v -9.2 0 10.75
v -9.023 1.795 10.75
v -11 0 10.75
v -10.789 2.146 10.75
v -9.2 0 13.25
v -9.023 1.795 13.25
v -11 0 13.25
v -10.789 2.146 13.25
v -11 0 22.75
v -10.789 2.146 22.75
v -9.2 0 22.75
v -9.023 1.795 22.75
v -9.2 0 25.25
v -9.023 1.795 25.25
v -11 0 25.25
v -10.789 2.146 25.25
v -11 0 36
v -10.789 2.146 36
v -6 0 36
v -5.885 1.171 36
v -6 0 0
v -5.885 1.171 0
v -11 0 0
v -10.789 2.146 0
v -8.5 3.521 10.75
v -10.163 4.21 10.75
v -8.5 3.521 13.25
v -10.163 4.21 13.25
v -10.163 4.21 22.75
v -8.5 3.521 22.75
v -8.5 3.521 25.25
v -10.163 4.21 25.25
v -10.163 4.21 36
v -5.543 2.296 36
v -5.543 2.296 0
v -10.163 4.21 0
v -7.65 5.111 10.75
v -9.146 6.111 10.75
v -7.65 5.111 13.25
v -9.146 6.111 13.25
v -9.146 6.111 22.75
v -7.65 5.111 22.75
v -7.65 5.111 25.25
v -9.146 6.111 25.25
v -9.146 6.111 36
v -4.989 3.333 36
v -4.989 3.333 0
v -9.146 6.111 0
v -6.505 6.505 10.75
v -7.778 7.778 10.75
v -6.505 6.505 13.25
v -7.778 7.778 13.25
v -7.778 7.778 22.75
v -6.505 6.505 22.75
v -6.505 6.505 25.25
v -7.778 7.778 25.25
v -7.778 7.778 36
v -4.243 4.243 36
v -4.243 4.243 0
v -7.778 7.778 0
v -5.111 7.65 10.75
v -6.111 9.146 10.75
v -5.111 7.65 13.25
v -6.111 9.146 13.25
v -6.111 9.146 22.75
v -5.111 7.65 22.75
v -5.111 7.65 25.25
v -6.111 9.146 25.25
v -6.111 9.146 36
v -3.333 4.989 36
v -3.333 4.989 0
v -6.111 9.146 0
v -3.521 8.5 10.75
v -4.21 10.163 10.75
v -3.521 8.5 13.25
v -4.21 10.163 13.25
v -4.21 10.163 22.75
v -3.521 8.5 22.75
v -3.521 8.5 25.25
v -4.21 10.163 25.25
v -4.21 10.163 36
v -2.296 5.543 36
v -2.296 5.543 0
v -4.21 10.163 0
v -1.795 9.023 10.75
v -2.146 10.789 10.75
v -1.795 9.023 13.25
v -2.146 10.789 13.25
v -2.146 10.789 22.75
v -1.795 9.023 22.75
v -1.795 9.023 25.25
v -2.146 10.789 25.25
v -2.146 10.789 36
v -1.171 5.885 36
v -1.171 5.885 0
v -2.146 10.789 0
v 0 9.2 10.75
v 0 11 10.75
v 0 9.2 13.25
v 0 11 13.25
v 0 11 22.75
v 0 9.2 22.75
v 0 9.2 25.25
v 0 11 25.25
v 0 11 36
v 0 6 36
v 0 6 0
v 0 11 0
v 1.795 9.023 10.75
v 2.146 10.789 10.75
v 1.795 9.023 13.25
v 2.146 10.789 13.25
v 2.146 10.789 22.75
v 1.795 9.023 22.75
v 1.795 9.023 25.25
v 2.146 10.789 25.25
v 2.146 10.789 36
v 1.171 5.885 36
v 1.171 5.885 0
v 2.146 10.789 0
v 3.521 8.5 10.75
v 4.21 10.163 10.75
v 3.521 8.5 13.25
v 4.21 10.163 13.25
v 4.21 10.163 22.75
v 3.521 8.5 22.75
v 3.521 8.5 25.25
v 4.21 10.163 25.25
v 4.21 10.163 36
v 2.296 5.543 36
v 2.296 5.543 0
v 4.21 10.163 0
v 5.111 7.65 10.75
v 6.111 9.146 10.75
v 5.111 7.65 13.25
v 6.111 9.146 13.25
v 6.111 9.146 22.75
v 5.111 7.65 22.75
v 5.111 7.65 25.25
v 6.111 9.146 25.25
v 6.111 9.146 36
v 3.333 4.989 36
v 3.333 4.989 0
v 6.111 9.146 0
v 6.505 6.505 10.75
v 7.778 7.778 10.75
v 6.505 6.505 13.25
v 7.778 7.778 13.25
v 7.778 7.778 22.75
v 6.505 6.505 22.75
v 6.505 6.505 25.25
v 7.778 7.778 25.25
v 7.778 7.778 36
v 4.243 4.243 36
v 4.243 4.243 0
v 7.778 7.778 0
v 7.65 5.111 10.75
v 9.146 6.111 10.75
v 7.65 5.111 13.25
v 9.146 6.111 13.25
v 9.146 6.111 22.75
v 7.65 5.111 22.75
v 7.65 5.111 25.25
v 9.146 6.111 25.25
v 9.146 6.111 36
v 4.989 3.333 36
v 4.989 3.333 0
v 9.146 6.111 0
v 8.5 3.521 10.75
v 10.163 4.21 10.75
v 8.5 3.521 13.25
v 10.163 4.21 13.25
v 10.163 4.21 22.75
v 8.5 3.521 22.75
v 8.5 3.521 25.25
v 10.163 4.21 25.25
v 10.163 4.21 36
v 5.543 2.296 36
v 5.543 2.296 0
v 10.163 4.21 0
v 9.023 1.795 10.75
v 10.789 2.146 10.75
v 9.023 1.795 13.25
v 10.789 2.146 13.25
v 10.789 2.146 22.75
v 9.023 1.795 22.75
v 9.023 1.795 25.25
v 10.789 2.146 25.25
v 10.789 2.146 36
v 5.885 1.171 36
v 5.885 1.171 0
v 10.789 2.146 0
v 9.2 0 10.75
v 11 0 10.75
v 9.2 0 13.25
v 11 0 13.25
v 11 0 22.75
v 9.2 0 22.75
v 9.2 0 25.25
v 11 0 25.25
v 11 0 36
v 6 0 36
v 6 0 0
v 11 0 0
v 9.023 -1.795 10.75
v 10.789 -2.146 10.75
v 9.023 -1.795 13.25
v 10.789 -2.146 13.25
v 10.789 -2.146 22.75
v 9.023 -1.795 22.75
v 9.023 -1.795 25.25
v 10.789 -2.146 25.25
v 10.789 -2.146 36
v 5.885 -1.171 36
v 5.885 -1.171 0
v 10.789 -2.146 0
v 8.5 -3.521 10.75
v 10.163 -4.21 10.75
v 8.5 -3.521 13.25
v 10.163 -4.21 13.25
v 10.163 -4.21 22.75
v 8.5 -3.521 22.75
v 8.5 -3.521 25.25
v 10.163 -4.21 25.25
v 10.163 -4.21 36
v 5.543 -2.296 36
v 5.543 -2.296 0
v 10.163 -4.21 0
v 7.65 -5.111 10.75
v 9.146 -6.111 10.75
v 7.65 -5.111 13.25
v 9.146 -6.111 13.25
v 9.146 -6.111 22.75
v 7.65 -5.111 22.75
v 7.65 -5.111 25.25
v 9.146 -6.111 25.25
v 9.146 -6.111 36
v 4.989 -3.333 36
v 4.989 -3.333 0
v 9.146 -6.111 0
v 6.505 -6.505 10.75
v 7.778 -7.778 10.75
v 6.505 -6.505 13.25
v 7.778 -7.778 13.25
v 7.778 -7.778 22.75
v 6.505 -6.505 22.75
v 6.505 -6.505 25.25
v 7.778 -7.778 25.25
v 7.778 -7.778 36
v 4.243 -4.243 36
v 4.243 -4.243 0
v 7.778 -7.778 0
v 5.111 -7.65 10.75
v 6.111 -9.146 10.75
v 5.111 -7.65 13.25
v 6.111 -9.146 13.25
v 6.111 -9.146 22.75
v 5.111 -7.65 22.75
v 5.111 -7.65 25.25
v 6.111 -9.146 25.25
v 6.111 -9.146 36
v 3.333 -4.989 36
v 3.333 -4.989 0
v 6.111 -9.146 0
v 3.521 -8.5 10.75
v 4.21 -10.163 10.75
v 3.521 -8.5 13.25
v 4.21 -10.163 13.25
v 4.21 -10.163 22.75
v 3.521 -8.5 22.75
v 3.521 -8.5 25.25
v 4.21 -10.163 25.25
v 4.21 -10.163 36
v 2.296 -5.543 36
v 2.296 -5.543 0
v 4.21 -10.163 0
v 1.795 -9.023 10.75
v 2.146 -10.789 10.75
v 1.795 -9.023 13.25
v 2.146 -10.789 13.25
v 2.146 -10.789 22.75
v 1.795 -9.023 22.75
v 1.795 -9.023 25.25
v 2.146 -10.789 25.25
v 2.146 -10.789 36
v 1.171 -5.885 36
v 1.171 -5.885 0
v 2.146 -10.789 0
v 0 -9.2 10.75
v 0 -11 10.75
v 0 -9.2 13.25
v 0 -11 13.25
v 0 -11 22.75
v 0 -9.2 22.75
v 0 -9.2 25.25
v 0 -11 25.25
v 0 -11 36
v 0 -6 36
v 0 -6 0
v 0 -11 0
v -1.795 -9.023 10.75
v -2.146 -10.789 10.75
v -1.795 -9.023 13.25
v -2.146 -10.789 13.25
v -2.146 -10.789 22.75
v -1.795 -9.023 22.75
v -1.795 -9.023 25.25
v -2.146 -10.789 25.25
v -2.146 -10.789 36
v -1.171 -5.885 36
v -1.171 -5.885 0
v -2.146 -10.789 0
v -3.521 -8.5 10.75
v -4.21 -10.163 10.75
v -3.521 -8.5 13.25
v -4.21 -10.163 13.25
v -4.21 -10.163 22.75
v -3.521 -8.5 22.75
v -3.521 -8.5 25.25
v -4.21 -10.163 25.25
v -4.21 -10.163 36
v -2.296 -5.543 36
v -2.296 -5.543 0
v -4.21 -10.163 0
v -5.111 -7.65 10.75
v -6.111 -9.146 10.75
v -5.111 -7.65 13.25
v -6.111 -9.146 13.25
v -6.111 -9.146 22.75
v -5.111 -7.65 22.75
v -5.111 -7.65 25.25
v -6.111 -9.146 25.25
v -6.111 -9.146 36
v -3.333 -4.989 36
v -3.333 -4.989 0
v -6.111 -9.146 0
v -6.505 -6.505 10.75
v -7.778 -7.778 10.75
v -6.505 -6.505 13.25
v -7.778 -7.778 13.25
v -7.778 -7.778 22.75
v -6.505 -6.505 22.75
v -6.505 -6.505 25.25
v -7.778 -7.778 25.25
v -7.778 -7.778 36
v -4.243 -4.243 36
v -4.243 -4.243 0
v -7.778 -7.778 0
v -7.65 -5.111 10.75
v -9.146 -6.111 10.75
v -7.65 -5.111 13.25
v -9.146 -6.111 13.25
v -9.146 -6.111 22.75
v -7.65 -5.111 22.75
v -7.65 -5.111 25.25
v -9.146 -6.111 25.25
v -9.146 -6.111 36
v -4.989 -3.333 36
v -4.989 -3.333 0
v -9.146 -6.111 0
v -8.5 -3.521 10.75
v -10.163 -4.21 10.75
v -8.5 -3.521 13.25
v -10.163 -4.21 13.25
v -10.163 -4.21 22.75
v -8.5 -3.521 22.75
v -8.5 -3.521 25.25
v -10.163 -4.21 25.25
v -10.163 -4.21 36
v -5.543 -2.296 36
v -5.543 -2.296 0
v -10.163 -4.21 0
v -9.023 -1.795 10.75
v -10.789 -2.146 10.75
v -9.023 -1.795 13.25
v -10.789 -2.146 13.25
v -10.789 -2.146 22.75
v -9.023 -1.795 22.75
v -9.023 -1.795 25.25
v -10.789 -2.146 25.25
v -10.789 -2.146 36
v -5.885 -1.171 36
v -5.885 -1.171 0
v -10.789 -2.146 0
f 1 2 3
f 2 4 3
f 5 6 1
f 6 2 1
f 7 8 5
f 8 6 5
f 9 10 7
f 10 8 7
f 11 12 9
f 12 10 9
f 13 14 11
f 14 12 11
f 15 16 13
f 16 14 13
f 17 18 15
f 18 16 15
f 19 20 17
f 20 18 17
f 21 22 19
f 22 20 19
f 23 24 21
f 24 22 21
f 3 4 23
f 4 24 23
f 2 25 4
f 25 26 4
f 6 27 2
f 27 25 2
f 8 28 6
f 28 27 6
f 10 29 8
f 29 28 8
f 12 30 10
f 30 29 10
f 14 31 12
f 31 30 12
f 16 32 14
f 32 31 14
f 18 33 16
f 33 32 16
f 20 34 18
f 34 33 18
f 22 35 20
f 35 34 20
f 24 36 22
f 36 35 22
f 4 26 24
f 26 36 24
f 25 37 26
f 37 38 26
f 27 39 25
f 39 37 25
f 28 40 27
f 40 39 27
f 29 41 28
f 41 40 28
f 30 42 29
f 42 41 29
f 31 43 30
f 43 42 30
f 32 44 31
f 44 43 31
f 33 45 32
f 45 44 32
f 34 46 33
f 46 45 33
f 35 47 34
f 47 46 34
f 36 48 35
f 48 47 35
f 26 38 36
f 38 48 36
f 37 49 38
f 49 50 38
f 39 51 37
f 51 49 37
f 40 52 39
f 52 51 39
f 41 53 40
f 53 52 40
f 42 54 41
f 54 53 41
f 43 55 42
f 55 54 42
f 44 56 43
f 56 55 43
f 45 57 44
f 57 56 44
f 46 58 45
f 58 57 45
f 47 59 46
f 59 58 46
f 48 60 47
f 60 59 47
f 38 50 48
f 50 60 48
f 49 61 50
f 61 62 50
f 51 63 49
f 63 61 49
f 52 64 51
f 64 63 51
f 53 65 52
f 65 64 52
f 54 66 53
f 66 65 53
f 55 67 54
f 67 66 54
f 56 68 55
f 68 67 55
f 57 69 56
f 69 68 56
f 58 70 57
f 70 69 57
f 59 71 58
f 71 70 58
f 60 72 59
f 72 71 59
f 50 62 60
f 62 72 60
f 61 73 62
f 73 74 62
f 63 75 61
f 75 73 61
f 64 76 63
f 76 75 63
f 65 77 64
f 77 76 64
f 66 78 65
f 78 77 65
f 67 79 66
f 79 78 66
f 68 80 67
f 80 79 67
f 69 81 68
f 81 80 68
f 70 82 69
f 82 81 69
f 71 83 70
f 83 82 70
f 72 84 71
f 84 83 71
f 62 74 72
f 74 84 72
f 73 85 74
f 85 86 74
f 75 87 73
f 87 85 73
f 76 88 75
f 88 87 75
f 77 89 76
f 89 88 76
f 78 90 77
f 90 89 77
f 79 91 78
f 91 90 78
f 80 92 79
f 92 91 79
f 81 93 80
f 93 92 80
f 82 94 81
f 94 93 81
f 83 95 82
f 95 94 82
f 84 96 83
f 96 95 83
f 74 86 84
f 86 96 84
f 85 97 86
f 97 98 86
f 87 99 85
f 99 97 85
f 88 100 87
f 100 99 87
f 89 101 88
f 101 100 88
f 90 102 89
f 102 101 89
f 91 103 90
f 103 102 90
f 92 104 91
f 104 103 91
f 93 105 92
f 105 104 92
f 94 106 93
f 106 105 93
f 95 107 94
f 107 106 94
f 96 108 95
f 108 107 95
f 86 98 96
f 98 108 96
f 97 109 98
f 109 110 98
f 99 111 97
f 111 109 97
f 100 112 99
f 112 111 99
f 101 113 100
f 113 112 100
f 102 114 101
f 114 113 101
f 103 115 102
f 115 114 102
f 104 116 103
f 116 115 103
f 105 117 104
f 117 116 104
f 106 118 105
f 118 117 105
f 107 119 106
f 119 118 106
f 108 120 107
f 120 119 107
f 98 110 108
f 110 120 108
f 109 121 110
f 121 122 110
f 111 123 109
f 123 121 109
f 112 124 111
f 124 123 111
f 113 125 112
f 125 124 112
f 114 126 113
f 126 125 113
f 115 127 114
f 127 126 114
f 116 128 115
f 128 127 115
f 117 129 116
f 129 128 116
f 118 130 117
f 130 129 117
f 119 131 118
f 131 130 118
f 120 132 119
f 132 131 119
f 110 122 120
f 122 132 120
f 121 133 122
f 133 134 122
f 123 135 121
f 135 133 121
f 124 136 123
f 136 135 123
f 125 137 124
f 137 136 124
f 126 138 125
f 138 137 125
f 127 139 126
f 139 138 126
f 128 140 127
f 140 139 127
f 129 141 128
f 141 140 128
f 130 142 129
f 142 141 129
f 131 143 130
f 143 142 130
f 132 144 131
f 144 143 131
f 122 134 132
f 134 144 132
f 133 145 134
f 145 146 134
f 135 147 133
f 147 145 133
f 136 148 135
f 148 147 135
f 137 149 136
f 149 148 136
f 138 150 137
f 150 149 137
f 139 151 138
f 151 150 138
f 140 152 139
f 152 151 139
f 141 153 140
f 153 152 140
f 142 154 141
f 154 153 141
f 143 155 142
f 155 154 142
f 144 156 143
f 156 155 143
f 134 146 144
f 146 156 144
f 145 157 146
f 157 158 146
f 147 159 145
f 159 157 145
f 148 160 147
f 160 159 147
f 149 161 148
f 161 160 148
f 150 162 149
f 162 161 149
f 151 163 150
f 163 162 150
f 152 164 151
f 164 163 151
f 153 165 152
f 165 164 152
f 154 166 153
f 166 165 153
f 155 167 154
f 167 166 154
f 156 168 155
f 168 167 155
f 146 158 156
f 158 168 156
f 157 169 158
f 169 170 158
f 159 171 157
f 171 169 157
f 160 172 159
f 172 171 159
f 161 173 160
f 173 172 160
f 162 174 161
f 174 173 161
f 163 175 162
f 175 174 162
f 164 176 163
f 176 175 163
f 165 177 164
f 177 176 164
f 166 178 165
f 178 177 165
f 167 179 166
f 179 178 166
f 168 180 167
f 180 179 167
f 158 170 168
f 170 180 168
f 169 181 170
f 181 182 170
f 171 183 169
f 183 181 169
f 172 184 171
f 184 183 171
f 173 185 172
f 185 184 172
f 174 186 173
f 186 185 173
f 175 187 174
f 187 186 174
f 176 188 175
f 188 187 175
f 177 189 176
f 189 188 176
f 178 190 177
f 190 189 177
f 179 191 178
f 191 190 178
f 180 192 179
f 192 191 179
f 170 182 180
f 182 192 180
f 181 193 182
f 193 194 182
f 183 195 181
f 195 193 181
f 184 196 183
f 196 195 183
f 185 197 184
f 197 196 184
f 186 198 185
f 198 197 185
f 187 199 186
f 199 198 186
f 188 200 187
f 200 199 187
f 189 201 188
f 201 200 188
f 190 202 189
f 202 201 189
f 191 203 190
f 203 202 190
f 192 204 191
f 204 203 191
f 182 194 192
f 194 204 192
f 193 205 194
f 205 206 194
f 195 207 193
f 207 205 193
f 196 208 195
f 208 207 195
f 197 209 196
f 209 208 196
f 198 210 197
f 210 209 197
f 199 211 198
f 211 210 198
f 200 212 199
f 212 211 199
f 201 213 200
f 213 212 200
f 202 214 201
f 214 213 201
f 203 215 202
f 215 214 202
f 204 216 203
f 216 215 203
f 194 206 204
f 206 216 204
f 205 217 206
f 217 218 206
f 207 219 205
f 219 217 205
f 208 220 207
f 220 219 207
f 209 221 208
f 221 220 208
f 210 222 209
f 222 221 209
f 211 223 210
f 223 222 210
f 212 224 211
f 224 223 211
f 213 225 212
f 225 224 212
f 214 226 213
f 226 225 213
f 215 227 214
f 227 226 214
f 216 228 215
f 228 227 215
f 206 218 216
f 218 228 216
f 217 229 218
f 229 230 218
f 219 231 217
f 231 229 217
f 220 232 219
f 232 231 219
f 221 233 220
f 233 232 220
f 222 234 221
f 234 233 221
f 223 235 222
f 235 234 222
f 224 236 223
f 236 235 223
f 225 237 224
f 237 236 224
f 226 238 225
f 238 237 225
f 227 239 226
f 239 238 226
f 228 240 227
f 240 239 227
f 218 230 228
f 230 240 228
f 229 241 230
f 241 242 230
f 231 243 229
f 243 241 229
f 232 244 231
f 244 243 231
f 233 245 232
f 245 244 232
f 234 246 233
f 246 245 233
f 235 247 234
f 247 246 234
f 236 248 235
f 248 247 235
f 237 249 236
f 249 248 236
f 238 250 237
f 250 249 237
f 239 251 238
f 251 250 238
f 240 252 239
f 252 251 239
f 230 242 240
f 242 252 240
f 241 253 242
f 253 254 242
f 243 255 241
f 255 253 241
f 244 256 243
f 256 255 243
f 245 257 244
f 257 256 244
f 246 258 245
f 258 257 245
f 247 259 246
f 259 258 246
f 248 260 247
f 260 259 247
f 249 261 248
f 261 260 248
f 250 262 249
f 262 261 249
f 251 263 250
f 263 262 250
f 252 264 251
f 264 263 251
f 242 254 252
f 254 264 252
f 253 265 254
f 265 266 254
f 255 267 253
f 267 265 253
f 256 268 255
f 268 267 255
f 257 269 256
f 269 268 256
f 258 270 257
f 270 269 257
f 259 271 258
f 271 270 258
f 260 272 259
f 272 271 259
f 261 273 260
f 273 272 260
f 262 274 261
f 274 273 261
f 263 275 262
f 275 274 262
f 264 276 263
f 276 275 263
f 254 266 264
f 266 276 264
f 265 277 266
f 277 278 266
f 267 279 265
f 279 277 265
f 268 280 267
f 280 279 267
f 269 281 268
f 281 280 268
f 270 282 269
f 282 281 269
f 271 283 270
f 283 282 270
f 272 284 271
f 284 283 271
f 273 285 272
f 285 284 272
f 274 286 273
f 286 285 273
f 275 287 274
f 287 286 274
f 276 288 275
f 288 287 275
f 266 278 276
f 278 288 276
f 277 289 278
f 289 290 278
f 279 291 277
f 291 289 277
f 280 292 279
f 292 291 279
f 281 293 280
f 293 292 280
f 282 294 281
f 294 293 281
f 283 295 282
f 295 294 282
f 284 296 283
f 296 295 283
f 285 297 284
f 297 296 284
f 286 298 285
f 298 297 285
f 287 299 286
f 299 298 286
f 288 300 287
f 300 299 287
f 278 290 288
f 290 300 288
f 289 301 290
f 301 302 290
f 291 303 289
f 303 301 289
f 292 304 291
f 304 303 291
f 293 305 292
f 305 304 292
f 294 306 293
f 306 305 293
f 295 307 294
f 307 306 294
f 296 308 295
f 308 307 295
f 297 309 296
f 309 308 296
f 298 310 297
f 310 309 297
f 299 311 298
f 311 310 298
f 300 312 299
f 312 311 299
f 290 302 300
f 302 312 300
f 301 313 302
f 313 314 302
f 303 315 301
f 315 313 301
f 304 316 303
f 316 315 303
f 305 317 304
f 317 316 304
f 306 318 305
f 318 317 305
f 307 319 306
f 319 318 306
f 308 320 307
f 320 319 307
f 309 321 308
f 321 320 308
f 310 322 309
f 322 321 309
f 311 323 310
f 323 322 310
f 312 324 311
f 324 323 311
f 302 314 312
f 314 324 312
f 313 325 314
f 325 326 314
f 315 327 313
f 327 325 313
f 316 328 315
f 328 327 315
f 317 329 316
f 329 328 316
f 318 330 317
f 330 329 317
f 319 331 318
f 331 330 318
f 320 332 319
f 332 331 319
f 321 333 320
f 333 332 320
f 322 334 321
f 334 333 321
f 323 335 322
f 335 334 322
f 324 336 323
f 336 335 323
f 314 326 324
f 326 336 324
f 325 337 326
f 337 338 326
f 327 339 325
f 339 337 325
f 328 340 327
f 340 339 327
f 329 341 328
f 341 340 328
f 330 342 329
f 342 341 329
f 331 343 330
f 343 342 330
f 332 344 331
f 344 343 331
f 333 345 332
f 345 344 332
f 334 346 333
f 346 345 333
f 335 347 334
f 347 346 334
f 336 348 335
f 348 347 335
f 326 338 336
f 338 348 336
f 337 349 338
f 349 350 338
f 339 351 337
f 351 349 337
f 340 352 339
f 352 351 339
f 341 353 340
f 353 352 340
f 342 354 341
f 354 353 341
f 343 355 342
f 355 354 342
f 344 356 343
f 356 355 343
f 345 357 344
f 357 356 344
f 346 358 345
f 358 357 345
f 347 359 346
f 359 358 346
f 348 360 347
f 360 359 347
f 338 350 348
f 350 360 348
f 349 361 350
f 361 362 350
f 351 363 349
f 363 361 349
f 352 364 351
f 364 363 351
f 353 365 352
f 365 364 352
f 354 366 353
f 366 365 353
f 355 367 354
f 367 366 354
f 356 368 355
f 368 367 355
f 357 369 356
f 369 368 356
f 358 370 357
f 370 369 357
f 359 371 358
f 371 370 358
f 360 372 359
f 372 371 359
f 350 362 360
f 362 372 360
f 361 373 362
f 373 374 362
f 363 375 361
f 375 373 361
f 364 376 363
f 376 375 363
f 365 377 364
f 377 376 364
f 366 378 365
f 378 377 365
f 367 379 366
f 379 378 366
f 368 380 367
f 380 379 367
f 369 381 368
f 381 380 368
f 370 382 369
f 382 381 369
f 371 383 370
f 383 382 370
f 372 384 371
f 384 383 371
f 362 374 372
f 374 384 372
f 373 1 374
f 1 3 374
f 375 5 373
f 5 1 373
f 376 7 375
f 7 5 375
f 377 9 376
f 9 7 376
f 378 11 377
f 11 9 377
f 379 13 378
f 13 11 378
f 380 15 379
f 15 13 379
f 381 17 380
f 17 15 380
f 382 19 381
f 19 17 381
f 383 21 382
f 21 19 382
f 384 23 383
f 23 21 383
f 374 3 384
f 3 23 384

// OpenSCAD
$fn = 32;

// ----------------------------------------------------------------------
// Grooved revolve: plain_grooves, bore R6
// ----------------------------------------------------------------------

// --- parameters (mm) ---
bore_r = 6;               // bore radius
outer_r = 11;             // outer radius of the body
total_h = 36;             // overall height, Z
wall = 5;                 // radial wall thickness
groove_w = 2.5;           // groove width
groove_d = 1.8;           // groove depth
grooves = 2;              // number of outer grooves

bbox_x = 2 * outer_r;  // full diameter
bore_d = 2 * bore_r;  // bore diameter
body_d = 2 * outer_r;  // body diameter
revolve_angle = 360;  // full turn around the Z axis

profile = [[6, 0], [11, 0], [11, 10.75], [9.2, 10.75], [9.2, 13.25], [11, 13.25], [11, 22.75], [9.2, 22.75], [9.2, 25.25], [11, 25.25], [11, 36], [6, 36]];  // primary outline, 12 points, counter clockwise

// --- the one profile operation ---
rotate_extrude(angle = revolve_angle) polygon(points = profile);
